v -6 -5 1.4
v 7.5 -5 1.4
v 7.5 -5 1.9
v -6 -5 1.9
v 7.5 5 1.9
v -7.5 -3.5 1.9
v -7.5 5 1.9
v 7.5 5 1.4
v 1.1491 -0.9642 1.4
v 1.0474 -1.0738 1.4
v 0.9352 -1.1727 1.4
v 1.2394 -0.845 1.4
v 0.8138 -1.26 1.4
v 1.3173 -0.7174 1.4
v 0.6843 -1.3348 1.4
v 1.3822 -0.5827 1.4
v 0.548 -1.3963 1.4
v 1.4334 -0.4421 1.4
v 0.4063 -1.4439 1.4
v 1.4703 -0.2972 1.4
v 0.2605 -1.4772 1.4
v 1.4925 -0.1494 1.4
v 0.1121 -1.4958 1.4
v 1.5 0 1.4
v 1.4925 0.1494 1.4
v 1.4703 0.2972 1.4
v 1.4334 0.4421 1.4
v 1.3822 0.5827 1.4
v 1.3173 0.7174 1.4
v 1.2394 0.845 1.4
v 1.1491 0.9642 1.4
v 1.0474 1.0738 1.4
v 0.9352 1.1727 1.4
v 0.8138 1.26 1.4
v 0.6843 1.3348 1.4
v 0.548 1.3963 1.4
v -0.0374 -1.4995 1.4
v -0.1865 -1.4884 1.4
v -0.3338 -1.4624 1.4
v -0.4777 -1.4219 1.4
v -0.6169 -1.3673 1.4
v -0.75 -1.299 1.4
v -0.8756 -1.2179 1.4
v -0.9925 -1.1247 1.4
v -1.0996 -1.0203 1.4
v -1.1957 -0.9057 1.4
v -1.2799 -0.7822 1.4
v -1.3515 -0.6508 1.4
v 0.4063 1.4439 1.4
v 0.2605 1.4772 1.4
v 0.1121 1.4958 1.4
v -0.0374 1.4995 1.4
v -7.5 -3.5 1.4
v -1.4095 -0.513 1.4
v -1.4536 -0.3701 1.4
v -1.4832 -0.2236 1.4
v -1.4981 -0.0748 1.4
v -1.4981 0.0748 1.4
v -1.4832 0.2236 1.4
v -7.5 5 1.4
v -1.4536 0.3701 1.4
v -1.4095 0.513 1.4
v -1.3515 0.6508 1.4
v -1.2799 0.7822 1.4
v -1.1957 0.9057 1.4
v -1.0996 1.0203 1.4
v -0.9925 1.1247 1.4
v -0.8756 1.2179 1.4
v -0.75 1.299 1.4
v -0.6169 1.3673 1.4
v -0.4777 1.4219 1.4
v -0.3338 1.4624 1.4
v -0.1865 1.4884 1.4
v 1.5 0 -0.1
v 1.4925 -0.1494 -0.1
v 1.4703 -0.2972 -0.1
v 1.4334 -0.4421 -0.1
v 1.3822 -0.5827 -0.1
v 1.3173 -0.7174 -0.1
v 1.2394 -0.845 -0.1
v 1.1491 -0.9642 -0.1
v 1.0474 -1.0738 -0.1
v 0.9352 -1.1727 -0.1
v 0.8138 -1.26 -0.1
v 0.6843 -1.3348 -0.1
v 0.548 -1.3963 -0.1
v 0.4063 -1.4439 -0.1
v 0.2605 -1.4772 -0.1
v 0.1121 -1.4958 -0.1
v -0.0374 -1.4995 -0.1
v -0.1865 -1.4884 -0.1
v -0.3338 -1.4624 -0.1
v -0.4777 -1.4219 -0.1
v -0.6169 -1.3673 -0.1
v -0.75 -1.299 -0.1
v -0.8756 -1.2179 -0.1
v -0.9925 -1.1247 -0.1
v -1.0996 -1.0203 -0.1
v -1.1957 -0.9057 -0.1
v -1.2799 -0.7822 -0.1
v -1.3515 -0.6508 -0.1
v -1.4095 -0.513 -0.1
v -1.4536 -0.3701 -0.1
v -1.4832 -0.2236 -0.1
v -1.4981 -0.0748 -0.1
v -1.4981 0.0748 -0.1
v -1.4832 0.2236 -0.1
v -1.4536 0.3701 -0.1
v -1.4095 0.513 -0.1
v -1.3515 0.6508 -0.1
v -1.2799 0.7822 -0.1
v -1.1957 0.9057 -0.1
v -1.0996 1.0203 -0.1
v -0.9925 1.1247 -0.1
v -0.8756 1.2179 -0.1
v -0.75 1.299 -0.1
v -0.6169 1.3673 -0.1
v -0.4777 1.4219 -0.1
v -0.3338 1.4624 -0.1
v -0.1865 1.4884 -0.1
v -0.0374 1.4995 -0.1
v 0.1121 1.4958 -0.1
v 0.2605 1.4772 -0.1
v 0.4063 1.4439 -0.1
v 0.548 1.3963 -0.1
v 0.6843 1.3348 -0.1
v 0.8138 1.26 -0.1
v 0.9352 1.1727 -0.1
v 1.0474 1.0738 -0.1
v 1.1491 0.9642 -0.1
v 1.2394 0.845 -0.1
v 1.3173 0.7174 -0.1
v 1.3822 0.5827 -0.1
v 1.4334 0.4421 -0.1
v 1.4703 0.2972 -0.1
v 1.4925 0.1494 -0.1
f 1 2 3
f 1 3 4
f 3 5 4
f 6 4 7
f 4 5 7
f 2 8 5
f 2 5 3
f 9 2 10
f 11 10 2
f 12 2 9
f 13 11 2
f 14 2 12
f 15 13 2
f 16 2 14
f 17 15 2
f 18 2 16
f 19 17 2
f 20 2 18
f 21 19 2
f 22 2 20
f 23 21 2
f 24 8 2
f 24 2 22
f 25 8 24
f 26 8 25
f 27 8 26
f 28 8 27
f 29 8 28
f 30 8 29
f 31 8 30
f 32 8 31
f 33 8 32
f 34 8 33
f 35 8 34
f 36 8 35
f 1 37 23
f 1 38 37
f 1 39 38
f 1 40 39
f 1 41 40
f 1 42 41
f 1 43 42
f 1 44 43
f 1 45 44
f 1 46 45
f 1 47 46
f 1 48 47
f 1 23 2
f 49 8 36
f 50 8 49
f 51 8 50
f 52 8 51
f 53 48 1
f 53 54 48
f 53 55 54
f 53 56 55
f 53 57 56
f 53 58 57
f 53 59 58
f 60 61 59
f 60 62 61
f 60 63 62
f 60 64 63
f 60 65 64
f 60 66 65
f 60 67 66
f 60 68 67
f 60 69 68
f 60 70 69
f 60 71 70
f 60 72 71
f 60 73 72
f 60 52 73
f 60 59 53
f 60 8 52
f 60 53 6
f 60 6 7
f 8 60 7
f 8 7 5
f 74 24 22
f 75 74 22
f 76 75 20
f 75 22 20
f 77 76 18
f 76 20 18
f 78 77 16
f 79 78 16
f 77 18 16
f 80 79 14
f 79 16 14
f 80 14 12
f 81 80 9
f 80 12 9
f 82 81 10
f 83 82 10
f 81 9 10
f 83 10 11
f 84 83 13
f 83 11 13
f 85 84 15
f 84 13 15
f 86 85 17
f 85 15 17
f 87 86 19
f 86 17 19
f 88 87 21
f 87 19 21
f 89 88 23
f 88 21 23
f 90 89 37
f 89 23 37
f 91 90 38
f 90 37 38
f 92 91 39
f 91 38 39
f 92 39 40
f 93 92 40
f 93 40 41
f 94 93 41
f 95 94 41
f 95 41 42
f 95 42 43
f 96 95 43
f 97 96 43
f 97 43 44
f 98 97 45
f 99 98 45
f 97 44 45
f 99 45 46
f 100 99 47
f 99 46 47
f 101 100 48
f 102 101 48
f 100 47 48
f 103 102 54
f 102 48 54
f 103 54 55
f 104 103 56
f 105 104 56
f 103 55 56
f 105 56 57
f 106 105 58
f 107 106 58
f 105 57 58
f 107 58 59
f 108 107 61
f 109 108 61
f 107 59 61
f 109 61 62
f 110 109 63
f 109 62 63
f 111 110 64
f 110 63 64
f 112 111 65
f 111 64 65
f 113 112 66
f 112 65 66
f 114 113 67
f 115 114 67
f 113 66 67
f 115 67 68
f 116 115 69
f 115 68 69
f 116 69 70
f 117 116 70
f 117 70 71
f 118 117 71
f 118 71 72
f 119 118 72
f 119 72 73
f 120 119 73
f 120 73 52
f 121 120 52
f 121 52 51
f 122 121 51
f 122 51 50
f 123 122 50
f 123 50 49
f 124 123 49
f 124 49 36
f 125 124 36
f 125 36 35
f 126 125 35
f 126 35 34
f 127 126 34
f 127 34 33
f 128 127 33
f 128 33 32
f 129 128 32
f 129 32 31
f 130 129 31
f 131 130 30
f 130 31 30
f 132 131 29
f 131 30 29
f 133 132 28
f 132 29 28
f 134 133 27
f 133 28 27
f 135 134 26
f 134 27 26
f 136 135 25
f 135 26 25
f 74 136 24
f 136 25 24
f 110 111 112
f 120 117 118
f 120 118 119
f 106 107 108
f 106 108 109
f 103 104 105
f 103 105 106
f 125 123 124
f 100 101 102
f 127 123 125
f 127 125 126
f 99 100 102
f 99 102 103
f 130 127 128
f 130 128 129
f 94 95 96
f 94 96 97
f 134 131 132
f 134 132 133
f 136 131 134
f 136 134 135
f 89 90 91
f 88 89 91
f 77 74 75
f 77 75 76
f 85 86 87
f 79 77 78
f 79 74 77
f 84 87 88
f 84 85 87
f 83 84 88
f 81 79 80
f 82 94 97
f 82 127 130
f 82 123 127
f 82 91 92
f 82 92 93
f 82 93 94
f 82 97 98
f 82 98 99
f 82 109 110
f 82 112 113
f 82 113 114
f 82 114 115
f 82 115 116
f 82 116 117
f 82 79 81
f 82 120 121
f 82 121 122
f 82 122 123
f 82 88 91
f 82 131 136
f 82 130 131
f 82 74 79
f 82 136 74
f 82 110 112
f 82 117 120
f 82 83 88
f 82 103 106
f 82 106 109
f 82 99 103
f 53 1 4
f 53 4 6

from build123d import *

# Parameters (mm, degrees)
PAD_DEPTH    = 0.5
SKETCH_R     = 1.5
PAD001_DEPTH = 1.5


with BuildPart() as part:
    # Sketch002 → Pad (new body)
    with BuildSketch(Plane.XY.offset(1.4)):
        Polygon((-7.5, 5), (7.5, 5), (7.5, -5), (-6, -5), (-7.5, -3.5), align=None)
    extrude(amount=PAD_DEPTH)

    # Sketch (on Face6 of Pad) → Pad001 (join)
    with BuildSketch(Plane(origin=(0, 0, 1.4), x_dir=(1, 0, 0), z_dir=(0, 0, -1))):
        Circle(SKETCH_R)
    extrude(amount=PAD001_DEPTH)


solid = part.part
